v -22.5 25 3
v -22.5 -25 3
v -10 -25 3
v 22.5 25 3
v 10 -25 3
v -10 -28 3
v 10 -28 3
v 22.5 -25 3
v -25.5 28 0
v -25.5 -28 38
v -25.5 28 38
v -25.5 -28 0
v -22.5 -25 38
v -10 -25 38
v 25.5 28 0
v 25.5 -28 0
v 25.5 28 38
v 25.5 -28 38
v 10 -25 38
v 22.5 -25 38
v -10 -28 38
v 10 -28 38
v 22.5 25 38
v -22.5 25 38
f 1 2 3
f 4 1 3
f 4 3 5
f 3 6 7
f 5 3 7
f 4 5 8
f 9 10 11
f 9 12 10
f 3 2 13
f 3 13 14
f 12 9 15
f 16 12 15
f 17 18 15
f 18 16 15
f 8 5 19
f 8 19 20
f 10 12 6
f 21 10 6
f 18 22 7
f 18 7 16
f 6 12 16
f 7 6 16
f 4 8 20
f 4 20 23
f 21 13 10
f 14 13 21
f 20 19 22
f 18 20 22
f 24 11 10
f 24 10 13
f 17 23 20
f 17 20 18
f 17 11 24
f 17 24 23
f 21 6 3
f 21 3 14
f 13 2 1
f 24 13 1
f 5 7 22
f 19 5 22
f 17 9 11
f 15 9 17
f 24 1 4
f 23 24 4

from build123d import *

# Parameters (mm, degrees)
SKETCH_W      = 51
SKETCH_H      = 56
PAD_DEPTH     = 3
SKETCH001_W   = 51
SKETCH001_H   = 56
SKETCH001_W_2 = 45
SKETCH001_H_2 = 50
PAD001_DEPTH  = 35
SKETCH002_W   = 20
SKETCH002_H   = 35
POCKET_DEPTH  = 3


with BuildPart() as part:
    # Sketch → Pad (new body)
    with BuildSketch(Plane.XY):
        Rectangle(SKETCH_W, SKETCH_H)
    extrude(amount=PAD_DEPTH)

    # Sketch001 (on Face6 of Pad) → Pad001 (join)
    with BuildSketch(Plane.XY.offset(3)):
        Rectangle(SKETCH001_W, SKETCH001_H)
        Rectangle(SKETCH001_W_2, SKETCH001_H_2, mode=Mode.SUBTRACT)
    extrude(amount=PAD001_DEPTH)

    # Sketch002 (on Face10 of Pad001) → Pocket (cut)
    with BuildSketch(Plane.XZ.offset(28)):
        with Locations((0, 20.5)):
            Rectangle(SKETCH002_W, SKETCH002_H)
    extrude(amount=-POCKET_DEPTH, mode=Mode.SUBTRACT)


solid = part.part
